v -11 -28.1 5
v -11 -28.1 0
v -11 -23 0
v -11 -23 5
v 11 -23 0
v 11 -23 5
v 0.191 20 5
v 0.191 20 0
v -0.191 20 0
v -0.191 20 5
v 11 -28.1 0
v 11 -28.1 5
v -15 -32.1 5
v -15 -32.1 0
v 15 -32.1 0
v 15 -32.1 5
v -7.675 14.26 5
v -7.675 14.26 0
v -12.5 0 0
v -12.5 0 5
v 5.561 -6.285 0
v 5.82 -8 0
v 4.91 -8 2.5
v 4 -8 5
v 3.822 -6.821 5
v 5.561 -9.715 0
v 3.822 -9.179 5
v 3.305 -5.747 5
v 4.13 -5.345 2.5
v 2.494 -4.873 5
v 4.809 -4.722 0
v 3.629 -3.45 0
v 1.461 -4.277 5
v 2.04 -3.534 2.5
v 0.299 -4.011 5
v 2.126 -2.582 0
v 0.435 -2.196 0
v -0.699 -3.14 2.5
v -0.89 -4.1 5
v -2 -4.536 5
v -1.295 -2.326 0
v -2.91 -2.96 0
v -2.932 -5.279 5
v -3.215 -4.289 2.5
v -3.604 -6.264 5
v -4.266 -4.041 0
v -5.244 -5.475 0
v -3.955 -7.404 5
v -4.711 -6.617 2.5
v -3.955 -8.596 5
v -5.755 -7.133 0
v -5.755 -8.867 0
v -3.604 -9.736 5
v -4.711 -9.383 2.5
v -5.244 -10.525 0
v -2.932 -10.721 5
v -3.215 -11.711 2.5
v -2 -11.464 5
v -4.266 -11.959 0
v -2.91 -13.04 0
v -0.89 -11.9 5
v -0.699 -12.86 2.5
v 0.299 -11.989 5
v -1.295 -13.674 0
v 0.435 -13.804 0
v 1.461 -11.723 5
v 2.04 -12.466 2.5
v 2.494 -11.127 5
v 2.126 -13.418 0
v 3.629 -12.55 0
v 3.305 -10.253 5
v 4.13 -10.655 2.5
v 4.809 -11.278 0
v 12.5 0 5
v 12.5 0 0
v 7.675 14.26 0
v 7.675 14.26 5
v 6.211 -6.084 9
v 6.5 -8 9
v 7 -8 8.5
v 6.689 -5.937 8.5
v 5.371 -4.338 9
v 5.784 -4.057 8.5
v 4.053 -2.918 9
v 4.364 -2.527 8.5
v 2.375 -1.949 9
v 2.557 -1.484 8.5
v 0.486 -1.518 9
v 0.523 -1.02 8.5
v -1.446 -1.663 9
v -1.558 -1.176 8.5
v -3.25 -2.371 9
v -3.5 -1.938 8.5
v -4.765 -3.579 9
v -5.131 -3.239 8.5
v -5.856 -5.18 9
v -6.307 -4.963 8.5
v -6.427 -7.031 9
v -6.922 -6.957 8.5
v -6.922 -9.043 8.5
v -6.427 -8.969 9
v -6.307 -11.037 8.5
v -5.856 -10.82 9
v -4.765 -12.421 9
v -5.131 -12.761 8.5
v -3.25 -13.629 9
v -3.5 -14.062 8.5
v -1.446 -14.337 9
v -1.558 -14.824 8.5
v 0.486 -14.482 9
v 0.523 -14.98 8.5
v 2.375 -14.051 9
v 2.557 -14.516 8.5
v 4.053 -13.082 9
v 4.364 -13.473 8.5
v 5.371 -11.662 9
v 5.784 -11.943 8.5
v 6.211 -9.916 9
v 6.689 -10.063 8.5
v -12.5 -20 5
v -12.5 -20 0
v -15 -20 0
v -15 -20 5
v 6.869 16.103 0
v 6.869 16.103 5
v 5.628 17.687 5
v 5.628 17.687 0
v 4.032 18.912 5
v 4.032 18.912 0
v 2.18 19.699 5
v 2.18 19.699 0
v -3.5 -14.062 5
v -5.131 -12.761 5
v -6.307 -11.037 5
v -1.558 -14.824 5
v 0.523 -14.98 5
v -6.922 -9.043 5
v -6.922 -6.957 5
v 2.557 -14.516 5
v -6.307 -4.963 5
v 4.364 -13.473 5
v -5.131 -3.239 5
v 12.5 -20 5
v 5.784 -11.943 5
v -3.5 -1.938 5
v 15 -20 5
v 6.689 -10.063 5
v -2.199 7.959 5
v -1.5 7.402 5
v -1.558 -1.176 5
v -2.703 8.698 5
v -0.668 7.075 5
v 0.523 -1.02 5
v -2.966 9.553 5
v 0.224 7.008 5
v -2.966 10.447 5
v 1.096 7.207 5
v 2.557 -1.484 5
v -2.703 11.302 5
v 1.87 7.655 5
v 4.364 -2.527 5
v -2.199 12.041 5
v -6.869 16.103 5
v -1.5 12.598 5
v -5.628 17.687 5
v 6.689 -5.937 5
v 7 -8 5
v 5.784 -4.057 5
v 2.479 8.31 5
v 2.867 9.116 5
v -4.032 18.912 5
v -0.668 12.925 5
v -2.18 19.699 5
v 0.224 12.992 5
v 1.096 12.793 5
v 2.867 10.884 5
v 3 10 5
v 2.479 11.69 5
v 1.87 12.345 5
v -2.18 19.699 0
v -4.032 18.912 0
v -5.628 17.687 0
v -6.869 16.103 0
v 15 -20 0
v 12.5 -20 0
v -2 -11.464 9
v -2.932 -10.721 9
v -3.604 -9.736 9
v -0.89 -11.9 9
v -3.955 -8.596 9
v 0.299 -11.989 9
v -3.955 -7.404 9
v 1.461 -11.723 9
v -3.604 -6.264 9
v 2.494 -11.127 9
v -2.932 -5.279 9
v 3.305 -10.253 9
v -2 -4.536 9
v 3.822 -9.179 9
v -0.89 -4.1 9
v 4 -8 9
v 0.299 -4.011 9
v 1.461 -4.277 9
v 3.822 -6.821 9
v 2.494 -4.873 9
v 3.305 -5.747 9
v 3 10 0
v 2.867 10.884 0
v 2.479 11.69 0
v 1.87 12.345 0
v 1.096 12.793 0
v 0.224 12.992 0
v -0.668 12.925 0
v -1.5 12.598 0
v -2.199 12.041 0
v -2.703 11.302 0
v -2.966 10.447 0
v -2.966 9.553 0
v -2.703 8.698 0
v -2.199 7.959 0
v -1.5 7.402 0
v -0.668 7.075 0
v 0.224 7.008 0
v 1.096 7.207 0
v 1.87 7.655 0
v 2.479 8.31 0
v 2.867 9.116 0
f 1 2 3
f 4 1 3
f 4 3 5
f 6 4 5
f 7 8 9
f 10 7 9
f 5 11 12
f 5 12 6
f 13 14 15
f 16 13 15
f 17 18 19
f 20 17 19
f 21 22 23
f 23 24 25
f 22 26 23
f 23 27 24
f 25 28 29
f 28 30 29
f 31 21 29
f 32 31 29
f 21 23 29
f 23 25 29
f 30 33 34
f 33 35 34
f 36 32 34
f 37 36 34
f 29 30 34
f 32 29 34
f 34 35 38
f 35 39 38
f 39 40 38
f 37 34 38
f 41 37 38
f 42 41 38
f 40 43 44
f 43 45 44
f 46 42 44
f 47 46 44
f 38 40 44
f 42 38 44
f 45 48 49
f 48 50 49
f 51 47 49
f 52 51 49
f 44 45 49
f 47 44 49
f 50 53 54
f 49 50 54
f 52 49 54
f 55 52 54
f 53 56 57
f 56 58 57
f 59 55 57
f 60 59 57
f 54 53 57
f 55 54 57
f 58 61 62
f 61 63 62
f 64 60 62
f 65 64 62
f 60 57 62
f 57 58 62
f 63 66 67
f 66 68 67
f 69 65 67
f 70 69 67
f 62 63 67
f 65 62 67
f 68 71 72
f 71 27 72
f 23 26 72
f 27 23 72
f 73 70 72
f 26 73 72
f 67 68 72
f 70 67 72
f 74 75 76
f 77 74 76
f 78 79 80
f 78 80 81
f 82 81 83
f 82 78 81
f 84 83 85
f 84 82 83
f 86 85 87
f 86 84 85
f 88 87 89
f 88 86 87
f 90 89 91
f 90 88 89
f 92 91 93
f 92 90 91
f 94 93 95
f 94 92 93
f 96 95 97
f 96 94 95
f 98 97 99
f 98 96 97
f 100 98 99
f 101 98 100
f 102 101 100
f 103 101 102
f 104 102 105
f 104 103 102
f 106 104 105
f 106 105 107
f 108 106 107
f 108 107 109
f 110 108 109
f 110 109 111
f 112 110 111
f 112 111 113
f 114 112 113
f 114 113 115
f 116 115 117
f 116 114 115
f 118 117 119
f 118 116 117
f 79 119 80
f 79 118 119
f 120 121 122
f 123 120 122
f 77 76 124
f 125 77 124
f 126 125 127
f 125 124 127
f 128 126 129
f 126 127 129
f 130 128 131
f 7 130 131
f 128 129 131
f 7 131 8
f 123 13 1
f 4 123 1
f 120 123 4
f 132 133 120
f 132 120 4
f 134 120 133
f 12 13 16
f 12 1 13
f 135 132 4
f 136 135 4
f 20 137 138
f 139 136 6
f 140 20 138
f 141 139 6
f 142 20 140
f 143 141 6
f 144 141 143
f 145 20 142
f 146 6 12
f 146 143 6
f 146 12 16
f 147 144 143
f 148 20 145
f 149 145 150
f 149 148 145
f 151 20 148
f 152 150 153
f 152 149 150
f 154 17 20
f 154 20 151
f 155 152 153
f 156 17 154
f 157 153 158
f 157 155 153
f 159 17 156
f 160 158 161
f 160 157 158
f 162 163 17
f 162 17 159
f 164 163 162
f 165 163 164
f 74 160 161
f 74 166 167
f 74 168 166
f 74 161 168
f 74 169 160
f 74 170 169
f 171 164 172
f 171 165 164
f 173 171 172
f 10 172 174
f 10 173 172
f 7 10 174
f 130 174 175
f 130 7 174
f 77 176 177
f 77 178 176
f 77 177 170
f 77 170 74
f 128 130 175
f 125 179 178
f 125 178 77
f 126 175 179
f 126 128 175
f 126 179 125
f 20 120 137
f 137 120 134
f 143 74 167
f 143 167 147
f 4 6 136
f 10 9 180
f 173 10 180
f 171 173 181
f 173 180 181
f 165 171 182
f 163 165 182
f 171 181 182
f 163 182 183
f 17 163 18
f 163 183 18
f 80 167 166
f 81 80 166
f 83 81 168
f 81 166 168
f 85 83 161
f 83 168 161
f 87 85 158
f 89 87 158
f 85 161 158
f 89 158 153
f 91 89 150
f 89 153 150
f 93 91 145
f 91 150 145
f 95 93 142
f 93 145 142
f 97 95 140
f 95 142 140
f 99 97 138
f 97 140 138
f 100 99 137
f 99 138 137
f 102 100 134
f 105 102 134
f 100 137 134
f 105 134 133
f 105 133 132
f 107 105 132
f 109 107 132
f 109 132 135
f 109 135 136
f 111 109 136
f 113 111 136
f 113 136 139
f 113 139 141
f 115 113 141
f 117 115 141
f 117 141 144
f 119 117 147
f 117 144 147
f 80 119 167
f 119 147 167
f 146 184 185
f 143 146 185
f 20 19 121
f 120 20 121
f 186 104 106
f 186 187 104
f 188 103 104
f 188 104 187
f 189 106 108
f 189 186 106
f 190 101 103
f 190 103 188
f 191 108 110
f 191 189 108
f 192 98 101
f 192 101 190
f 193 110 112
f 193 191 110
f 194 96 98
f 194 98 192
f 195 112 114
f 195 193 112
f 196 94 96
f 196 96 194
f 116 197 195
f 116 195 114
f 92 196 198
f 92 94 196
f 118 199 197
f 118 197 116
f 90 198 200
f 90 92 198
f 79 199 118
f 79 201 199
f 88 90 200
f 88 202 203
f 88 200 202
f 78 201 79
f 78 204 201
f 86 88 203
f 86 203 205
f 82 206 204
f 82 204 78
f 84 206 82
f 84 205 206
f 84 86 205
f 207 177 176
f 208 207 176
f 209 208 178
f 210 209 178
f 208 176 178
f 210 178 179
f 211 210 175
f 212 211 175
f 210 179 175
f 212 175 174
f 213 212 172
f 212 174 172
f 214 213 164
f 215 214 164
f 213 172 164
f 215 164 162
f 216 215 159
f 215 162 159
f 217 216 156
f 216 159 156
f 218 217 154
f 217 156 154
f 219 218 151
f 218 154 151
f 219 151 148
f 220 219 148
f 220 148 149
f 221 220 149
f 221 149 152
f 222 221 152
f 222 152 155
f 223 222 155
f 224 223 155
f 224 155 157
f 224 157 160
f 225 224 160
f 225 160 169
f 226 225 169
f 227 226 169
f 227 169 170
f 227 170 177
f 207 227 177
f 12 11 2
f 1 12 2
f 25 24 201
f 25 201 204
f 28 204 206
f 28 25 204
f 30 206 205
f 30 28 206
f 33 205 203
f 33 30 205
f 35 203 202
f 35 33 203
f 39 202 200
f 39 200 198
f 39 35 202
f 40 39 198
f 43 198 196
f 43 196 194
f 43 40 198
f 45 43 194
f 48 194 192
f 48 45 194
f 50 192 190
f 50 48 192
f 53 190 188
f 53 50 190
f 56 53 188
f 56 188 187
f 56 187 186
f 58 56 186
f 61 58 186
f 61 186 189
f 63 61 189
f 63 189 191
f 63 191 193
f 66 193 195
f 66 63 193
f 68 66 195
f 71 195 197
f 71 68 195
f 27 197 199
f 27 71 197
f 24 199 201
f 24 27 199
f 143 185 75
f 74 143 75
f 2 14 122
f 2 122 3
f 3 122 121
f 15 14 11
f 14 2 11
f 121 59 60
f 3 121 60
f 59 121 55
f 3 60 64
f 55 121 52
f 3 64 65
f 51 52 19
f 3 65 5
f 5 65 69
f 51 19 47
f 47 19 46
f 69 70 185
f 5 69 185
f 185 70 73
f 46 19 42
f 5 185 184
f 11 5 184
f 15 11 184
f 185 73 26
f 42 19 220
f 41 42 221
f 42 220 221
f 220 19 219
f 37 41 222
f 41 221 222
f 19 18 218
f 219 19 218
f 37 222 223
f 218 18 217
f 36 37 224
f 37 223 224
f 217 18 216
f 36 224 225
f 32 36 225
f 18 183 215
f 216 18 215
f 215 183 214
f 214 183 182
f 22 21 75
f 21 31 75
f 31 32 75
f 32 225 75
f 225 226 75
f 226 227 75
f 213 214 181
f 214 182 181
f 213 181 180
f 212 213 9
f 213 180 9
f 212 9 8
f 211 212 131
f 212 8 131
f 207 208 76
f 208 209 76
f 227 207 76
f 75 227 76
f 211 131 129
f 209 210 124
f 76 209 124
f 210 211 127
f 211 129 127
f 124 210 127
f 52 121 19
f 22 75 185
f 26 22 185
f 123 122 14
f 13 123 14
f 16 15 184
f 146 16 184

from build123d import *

# Parameters (mm, degrees)
SKETCH_1_W          = 4
SKETCH_1_H          = 5.1
EXTRUDE_1_DEPTH     = 5
SKETCH_2_R          = 3
CUT_EXTRUDE_1_DEPTH = 10
SKETCH_3_R          = 7
SKETCH_3_R_2        = 4
EXTRUDE_2_DEPTH     = 4
CHAMFER_1_SIZE      = 0.5
SKETCH_4_R          = 4
CUT_EXTRUDE_2_DEPTH = 10
CUT_EXTRUDE_2_DRAFT = 20


with BuildPart() as part:
    # Эскиз1 → Бобышка-Вытянуть1 (new body)
    with BuildSketch(Plane.XY):
        with BuildLine():
            ThreePointArc((7.674867745, 14.259797906), (4.86875016, 18.350131705), (0.190816738, 20))
            Line((0.190816738, 20), (-0.190816738, 20))
            ThreePointArc((-0.190816738, 20), (-4.86875016, 18.350131705), (-7.674867745, 14.259797906))
            Line((-7.674867745, 14.259797906), (-12.5, 0))
            Line((-12.5, 0), (-12.5, -20))
            Line((-12.5, -20), (12.5, -20))
            Line((12.5, -20), (12.5, 0))
            Line((12.5, 0), (7.674867745, 14.259797906))
        make_face()
        Polygon((15, -32.1), (15, -28.1), (11, -28.1), (-11, -28.1), (-15, -28.1), (-15, -32.1), align=None)
        with Locations((13, -25.55)):
            Rectangle(SKETCH_1_W, SKETCH_1_H)
        Polygon((15, -20), (12.5, -20), (-12.5, -20), (-15, -20), (-15, -23), (-11, -23), (11, -23), (15, -23), align=None)
        with Locations((-13, -25.55)):
            Rectangle(SKETCH_1_W, SKETCH_1_H)
    extrude(amount=EXTRUDE_1_DEPTH)

    # Эскиз2 → Вырез-Вытянуть1 (cut)
    with BuildSketch(Plane.XY.offset(5)):
        with Locations((0, 10)):
            Circle(SKETCH_2_R)
    extrude(amount=-CUT_EXTRUDE_1_DEPTH, mode=Mode.SUBTRACT)

    # Эскиз3 → Бобышка-Вытянуть2 (add)
    with BuildSketch(Plane.XY.offset(5)):
        with Locations((0, -8)):
            Circle(SKETCH_3_R)
        with Locations((0, -8)):
            Circle(SKETCH_3_R_2, mode=Mode.SUBTRACT)
    extrude(amount=EXTRUDE_2_DEPTH)

    # Фаска1
    chamfer_1_edges = [part.edges().sort_by_distance(p)[0] for p in [
        (-7, -8, 9),
    ]]
    chamfer(chamfer_1_edges, length=CHAMFER_1_SIZE)


with BuildPart() as cut_extrude_2_tool:
    # Эскиз4 → Вырез-Вытянуть2 (with draft: the straight prism first)
    with BuildSketch(Plane.XY.offset(5)):
        with Locations((0, -8)):
            Circle(SKETCH_4_R)
    extrude(amount=-CUT_EXTRUDE_2_DEPTH)
    # Вырез-Вытянуть2: the draft: its side faces are tilted about the plane it starts from
    cut_extrude_2_sides = [cut_extrude_2_tool.faces().sort_by_distance(p)[0] for p in [
        (-4, -8, 0),
    ]]
    draft(cut_extrude_2_sides, Plane.XY.offset(5), CUT_EXTRUDE_2_DRAFT)


with BuildPart() as part_1:
    add(part.part)

    # Вырез-Вытянуть2: cut by cut_extrude_2_tool
    add(cut_extrude_2_tool.part, mode=Mode.SUBTRACT)


solid = part_1.part
